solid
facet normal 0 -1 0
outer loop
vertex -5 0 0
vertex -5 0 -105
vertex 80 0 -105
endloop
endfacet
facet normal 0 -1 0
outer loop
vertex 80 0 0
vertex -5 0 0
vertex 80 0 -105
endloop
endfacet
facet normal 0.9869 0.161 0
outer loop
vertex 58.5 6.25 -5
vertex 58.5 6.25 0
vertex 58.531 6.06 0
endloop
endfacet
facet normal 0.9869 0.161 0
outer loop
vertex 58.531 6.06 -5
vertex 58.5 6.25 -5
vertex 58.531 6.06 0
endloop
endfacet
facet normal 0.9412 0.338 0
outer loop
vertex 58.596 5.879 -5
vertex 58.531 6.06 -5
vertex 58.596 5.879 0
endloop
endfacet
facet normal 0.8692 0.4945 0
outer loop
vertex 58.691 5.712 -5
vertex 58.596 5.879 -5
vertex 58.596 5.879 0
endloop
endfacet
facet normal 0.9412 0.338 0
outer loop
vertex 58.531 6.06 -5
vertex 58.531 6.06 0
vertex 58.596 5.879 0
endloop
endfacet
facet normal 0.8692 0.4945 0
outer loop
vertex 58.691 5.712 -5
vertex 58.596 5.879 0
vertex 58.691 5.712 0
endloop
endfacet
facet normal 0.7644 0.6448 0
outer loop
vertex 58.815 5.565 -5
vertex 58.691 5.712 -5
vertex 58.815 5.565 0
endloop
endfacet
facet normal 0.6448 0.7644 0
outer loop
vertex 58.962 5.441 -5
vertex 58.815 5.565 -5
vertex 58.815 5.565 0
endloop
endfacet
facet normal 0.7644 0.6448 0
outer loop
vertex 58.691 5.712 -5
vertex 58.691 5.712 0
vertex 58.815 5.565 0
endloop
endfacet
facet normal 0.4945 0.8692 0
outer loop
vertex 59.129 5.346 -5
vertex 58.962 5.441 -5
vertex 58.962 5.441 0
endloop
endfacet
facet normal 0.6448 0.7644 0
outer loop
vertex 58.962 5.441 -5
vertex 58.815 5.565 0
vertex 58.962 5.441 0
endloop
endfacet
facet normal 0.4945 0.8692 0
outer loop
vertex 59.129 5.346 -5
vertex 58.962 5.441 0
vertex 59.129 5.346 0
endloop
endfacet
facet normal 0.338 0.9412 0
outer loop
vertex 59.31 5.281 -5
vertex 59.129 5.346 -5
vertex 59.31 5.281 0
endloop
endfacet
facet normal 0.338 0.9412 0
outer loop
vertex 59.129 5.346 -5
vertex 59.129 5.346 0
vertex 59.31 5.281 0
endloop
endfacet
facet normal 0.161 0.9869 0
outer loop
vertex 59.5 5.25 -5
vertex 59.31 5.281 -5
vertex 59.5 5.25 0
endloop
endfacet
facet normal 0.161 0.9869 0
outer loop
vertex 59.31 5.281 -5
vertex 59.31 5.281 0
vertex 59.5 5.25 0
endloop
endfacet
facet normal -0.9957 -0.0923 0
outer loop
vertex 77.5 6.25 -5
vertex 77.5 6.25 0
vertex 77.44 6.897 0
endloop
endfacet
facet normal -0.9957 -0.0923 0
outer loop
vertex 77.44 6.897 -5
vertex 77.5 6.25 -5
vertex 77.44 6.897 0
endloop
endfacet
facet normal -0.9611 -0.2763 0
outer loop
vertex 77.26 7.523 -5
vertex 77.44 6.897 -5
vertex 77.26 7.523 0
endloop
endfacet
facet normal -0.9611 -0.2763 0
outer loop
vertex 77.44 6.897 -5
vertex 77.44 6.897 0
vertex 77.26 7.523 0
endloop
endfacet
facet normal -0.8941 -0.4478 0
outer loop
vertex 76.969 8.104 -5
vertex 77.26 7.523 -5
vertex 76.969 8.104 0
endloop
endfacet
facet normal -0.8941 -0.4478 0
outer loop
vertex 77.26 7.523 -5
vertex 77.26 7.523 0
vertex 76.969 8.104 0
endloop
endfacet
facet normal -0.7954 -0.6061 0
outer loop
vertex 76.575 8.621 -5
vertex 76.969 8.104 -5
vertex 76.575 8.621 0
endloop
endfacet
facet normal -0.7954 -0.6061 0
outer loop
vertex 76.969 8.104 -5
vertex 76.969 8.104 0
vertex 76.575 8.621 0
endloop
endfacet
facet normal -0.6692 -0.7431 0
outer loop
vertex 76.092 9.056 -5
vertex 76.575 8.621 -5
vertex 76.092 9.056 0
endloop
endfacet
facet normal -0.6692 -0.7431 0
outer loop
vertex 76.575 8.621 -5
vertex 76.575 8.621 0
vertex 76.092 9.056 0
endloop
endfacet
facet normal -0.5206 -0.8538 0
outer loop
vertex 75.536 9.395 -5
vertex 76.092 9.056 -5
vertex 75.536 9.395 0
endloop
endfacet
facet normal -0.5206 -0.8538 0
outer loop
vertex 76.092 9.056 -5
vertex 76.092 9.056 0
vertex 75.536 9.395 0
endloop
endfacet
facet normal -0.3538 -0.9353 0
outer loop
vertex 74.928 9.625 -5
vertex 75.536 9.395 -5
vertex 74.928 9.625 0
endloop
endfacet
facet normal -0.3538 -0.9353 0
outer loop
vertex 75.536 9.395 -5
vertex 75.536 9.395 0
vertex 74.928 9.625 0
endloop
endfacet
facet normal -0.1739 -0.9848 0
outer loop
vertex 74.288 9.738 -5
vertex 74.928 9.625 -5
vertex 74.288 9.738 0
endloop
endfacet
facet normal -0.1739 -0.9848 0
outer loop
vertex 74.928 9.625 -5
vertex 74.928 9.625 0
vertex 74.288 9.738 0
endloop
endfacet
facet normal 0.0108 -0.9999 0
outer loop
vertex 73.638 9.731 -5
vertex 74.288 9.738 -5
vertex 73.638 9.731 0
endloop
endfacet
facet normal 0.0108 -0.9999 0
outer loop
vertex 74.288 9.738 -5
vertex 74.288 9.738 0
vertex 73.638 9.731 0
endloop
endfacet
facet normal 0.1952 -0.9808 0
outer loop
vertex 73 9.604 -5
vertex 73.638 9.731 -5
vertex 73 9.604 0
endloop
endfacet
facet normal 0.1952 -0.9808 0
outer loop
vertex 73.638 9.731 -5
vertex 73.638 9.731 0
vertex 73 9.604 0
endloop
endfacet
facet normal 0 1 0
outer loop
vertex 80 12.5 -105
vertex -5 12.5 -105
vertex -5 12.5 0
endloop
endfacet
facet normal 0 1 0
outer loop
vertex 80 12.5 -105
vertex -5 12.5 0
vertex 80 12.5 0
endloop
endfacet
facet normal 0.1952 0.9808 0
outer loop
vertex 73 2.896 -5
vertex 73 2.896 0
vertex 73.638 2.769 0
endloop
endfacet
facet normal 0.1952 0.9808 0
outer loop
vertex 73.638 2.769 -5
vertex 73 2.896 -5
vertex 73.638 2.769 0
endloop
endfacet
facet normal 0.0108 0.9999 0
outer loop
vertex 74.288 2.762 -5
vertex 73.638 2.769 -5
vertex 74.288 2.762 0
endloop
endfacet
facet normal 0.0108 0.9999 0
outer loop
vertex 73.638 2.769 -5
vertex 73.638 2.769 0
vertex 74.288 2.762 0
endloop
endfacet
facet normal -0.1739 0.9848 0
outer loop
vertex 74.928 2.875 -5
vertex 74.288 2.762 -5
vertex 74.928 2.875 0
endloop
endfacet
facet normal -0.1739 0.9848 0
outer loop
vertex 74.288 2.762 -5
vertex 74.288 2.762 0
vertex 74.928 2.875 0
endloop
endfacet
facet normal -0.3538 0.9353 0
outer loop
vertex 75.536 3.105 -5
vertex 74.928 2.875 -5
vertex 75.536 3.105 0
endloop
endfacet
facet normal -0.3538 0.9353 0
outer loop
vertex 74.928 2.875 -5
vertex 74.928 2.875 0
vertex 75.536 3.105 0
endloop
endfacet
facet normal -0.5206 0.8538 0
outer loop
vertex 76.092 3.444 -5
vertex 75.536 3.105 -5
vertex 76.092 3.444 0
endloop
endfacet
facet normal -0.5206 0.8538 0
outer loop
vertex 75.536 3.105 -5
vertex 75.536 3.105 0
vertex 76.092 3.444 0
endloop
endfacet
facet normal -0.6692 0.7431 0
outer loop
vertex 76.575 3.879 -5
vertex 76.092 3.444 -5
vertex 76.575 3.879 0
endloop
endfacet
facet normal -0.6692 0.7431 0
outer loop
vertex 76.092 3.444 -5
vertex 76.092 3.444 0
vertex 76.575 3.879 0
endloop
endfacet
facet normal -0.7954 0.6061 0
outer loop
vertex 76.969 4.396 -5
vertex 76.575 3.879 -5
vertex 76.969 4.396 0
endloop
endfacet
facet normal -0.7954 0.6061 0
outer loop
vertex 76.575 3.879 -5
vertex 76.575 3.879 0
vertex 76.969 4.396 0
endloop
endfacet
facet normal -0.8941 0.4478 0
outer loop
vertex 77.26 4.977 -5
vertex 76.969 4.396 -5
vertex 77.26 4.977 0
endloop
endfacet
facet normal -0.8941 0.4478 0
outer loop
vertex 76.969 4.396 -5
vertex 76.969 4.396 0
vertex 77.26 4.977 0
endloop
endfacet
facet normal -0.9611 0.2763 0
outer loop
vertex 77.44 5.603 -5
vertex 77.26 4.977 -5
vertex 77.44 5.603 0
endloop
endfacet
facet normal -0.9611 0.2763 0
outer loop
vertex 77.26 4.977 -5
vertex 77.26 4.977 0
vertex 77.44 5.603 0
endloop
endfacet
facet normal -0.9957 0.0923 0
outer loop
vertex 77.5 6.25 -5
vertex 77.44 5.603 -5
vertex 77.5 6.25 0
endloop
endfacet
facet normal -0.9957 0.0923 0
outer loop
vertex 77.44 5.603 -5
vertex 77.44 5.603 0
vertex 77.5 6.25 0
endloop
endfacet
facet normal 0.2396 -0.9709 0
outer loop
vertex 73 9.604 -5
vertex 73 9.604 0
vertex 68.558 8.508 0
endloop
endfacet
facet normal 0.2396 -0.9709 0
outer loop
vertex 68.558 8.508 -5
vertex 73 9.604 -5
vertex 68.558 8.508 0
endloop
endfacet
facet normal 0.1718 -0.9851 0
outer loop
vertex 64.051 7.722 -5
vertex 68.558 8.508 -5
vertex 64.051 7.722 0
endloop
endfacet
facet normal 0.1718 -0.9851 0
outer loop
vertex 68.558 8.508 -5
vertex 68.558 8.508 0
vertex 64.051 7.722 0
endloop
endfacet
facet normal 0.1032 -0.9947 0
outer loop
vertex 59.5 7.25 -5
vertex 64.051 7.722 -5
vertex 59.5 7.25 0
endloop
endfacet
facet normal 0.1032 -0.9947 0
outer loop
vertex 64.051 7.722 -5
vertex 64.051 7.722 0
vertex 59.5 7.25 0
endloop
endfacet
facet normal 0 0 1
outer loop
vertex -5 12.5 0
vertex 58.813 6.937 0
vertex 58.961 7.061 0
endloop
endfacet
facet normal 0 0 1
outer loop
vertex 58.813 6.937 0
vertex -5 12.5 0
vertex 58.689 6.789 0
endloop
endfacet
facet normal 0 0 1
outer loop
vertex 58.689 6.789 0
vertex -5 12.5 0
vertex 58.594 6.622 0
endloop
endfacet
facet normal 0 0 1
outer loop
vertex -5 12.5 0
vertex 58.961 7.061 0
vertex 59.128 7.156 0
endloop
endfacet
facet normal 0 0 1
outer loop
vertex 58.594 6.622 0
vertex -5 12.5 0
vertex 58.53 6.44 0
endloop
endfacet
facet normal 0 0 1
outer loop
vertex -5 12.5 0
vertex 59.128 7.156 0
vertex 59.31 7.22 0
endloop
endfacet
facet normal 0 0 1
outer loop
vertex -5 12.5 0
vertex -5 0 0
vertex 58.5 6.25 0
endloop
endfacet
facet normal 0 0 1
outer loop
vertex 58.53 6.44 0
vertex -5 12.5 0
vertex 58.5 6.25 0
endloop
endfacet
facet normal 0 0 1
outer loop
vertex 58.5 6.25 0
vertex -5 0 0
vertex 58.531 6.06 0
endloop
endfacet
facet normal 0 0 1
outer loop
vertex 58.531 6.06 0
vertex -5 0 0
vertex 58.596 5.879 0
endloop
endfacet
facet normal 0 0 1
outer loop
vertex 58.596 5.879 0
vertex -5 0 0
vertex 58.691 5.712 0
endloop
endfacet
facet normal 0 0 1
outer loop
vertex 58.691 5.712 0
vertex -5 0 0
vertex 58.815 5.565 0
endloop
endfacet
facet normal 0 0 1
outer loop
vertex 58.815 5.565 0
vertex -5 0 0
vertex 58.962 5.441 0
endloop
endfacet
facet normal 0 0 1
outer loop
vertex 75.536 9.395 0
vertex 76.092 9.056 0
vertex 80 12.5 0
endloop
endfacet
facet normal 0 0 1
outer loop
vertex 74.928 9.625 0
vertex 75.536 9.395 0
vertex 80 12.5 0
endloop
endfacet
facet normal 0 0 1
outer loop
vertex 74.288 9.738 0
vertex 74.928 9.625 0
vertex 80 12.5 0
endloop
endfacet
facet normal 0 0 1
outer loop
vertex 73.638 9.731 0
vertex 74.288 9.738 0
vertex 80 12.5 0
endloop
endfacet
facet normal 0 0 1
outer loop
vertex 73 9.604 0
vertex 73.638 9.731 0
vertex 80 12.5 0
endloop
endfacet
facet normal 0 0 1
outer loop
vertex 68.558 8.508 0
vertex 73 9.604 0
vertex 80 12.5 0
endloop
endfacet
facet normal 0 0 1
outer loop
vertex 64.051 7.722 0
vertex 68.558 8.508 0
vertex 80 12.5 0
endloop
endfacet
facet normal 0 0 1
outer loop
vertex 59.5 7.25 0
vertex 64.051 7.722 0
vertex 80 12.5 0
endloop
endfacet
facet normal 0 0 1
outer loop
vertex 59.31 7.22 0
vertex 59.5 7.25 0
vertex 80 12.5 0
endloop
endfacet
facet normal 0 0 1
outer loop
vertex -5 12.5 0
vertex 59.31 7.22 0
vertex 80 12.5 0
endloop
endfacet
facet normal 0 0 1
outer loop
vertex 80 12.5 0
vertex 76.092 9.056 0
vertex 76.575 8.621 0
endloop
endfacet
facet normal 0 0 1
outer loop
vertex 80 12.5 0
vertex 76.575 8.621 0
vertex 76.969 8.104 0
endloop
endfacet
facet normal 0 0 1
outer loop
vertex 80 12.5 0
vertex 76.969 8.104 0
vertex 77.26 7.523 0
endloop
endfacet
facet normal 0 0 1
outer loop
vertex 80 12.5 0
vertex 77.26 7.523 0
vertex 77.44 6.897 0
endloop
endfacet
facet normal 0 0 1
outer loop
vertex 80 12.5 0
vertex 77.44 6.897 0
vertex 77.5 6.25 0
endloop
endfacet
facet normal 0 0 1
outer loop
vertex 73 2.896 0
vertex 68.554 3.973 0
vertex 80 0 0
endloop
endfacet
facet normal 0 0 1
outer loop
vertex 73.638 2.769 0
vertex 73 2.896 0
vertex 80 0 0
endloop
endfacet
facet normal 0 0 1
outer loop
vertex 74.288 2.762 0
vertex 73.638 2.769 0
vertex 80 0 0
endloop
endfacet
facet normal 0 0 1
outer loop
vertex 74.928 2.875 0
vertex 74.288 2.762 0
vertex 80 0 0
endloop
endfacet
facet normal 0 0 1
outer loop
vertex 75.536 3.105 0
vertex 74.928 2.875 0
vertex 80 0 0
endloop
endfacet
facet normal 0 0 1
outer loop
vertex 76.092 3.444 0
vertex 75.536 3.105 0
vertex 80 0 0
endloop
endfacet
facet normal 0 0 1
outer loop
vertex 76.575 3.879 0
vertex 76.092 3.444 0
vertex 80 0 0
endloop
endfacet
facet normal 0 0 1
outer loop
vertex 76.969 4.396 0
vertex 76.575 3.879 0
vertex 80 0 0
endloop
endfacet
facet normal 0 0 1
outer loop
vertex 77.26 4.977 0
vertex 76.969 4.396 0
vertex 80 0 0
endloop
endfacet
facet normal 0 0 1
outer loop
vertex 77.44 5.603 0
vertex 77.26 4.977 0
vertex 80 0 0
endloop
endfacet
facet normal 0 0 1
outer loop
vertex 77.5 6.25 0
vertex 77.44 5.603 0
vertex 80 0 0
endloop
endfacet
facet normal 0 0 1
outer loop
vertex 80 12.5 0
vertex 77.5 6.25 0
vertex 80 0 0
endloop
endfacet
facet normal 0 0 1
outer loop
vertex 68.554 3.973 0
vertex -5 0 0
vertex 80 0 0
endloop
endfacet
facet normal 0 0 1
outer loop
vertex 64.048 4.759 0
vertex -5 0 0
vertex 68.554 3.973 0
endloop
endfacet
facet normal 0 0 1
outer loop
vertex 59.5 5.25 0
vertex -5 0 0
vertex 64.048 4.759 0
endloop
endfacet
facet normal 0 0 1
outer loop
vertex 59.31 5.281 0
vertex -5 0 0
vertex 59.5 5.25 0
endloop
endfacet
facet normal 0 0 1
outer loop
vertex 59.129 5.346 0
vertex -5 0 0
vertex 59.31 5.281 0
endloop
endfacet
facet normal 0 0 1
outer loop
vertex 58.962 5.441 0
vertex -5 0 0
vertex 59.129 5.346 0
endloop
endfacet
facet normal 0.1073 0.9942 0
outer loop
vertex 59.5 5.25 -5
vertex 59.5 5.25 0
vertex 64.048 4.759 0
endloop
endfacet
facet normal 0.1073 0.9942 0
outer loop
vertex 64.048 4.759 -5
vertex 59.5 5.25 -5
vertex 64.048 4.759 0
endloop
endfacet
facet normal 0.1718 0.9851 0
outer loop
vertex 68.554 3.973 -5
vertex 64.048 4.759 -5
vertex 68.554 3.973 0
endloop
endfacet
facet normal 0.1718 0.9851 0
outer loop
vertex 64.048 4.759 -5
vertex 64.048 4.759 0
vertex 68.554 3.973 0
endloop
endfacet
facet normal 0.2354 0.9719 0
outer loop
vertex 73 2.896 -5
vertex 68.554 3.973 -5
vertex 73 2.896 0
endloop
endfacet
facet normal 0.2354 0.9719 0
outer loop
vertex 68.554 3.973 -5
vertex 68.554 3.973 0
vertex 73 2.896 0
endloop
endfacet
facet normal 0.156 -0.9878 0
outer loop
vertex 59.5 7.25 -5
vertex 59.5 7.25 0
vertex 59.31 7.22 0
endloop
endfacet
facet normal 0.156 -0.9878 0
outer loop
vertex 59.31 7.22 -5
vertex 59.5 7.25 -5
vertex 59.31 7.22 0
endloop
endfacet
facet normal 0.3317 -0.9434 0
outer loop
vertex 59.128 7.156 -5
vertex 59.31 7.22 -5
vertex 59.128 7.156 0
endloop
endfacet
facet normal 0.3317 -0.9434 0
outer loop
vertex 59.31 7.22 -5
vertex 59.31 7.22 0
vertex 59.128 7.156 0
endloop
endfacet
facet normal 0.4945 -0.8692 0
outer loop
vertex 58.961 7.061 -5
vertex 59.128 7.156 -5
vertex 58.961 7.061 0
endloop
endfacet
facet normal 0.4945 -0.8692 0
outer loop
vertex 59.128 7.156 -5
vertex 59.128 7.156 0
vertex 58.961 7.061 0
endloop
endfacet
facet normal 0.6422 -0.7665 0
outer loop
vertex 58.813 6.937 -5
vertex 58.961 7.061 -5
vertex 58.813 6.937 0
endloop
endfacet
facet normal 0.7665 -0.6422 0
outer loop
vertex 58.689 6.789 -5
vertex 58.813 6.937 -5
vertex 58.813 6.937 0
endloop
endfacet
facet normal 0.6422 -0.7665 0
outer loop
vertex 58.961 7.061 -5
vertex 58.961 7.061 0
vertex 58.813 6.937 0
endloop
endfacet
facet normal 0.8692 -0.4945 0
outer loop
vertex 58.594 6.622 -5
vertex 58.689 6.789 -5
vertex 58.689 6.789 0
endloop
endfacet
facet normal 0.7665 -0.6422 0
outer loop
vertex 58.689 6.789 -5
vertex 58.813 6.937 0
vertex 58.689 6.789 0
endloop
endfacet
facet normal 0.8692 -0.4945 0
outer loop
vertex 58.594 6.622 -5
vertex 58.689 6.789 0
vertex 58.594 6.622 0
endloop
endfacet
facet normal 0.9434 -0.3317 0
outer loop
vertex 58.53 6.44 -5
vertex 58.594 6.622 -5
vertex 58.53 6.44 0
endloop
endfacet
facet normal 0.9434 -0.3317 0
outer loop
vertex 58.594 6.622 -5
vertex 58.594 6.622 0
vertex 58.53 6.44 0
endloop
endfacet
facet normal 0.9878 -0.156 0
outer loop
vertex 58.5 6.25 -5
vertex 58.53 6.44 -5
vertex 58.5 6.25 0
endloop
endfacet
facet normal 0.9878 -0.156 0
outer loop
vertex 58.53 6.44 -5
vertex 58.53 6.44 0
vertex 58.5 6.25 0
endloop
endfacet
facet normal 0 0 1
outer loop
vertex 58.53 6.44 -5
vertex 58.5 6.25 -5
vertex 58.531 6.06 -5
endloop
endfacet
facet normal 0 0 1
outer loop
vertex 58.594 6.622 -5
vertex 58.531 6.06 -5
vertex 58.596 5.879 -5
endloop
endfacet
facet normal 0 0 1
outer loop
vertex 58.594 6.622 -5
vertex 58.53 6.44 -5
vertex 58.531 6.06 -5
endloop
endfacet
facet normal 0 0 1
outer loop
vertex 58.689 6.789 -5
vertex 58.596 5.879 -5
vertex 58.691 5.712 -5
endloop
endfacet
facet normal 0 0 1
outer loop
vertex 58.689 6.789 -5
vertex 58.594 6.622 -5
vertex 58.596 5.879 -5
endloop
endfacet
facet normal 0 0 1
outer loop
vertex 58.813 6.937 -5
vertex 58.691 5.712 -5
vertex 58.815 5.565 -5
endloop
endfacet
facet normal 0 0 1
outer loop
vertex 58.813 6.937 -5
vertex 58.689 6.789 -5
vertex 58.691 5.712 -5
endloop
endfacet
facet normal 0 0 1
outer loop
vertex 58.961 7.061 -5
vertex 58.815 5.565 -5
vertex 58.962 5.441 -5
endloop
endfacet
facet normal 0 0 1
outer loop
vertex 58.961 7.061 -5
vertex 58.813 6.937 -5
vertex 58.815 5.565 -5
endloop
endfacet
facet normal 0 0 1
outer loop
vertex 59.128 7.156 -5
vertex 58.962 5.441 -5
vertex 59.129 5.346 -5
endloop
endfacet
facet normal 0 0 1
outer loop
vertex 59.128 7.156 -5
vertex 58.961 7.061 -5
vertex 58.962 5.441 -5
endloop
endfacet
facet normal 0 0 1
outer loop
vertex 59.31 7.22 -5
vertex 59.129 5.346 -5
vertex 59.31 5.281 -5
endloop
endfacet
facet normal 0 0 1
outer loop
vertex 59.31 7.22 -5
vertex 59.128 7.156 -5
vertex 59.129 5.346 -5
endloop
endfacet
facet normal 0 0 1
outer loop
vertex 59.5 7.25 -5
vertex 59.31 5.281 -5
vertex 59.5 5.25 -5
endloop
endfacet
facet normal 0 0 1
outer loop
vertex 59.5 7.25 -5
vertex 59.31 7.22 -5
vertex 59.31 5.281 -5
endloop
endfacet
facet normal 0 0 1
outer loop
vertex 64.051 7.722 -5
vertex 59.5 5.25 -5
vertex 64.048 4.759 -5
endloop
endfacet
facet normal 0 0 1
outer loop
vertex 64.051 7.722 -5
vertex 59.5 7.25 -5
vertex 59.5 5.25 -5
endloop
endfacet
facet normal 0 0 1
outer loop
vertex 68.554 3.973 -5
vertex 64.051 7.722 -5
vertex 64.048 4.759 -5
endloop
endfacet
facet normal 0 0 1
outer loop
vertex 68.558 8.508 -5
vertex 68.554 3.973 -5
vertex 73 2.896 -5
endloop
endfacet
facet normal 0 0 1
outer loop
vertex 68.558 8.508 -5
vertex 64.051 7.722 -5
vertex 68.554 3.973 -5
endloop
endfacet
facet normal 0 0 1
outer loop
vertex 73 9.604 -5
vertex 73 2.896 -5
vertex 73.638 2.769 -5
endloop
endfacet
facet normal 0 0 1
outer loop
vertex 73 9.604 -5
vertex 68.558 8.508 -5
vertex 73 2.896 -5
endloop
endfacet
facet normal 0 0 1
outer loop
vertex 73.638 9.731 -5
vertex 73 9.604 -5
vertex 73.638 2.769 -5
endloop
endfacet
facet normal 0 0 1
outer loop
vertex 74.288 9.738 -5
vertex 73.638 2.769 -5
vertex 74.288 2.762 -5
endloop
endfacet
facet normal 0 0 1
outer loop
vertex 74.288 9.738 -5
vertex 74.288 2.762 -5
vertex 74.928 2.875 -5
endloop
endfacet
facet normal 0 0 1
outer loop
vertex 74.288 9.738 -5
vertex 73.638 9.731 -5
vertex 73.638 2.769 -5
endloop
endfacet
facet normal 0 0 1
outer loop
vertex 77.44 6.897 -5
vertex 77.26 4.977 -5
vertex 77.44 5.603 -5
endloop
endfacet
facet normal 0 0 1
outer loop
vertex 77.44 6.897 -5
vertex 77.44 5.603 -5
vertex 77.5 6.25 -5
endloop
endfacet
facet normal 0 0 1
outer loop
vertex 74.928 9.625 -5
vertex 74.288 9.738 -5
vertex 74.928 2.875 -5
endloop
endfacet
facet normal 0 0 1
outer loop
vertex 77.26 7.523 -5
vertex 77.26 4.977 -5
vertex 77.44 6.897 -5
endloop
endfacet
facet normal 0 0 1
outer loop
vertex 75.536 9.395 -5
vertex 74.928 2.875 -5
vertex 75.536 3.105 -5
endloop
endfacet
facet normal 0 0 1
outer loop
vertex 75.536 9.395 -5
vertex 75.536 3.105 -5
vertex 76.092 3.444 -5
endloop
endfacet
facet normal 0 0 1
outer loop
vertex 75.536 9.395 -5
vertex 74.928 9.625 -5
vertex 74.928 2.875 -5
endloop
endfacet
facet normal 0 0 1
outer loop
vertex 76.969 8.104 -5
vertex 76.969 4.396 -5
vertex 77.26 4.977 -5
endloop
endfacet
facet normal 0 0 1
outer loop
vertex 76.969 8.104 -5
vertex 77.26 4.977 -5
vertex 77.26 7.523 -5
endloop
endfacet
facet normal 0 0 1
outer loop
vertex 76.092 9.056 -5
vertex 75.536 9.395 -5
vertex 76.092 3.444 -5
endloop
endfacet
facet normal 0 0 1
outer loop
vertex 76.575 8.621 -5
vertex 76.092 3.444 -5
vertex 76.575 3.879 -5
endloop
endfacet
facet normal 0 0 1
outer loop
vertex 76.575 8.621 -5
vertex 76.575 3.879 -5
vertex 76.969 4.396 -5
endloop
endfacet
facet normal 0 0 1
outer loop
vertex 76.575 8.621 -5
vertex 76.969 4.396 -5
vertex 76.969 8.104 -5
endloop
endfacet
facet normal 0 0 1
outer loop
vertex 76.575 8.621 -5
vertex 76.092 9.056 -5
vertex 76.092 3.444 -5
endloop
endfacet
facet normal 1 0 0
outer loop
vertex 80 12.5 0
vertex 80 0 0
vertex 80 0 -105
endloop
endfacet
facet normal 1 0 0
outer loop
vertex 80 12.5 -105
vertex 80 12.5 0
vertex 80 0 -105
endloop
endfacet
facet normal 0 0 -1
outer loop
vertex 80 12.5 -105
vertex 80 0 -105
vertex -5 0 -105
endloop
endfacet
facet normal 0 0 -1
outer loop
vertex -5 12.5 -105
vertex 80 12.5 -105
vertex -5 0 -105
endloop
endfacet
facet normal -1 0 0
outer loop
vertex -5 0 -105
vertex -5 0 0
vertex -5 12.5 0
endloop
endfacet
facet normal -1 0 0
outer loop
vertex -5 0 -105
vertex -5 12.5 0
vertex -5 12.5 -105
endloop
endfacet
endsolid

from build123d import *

# Parameters (mm, degrees)
SKETCH1_W           = 80
SKETCH1_H           = 105
SKETCH1_W_2         = 5
BOSS_EXTRUDE1_DEPTH = 12.5
CUT_EXTRUDE1_DEPTH  = 5


with BuildPart() as part:
    # Sketch1 → Boss-Extrude1 (new body)
    with BuildSketch(Plane(origin=(0, 0, 0), x_dir=(1, 0, 0), z_dir=(0, 1, 0))):
        with Locations((40, 52.5)):
            Rectangle(SKETCH1_W, SKETCH1_H)
        with Locations((-2.5, 52.5)):
            Rectangle(SKETCH1_W_2, SKETCH1_H)
    extrude(amount=BOSS_EXTRUDE1_DEPTH)

    # Sketch2 → Cut-Extrude1 (cut)
    with BuildSketch(Plane.XY):
        with BuildLine():
            ThreePointArc((73, 2.895898034), (76.091650066, 3.44375696), (77.5, 6.25))
            Line((77.5, 6.25), (74, 6.25))
            Line((74, 6.25), (73, 6.25))
            Line((73, 6.25), (73, 2.895898034))
        make_face()
        with BuildLine():
            Line((74, 6.25), (77.5, 6.25))
            ThreePointArc((77.5, 6.25), (76.091650066, 9.05624304), (73, 9.604101966))
            Line((73, 9.604101966), (73, 6.25))
            Line((73, 6.25), (74, 6.25))
        make_face()
        with BuildLine():
            Line((73, 6.25), (73, 9.604101966))
            ThreePointArc((73, 9.604101966), (71.19375696, 8.341650066), (70.5, 6.25))
            Line((70.5, 6.25), (73, 6.25))
        make_face()
        with BuildLine():
            ThreePointArc((70.5, 6.25), (71.19375696, 4.158349934), (73, 2.895898034))
            Line((73, 2.895898034), (73, 6.25))
            Line((73, 6.25), (70.5, 6.25))
        make_face()
        with BuildLine():
            ThreePointArc((59.5, 5.25), (66.307499895, 4.402691993), (73, 2.895898034))
            ThreePointArc((73, 2.895898034), (71.19375696, 4.158349934), (70.5, 6.25))
            Line((70.5, 6.25), (59.5, 6.25))
            Line((59.5, 6.25), (58.5, 6.25))
            ThreePointArc((58.5, 6.25), (58.814539324, 5.564539324), (59.5, 5.25))
        make_face()
        with BuildLine():
            ThreePointArc((70.5, 6.25), (71.19375696, 8.341650066), (73, 9.604101966))
            ThreePointArc((73, 9.604101966), (66.311170081, 8.076260701), (59.5, 7.25))
            ThreePointArc((59.5, 7.25), (58.812768212, 6.937231788), (58.5, 6.25))
            Line((58.5, 6.25), (59.5, 6.25))
            Line((59.5, 6.25), (70.5, 6.25))
        make_face()
    extrude(amount=-CUT_EXTRUDE1_DEPTH, mode=Mode.SUBTRACT)


solid = part.part
